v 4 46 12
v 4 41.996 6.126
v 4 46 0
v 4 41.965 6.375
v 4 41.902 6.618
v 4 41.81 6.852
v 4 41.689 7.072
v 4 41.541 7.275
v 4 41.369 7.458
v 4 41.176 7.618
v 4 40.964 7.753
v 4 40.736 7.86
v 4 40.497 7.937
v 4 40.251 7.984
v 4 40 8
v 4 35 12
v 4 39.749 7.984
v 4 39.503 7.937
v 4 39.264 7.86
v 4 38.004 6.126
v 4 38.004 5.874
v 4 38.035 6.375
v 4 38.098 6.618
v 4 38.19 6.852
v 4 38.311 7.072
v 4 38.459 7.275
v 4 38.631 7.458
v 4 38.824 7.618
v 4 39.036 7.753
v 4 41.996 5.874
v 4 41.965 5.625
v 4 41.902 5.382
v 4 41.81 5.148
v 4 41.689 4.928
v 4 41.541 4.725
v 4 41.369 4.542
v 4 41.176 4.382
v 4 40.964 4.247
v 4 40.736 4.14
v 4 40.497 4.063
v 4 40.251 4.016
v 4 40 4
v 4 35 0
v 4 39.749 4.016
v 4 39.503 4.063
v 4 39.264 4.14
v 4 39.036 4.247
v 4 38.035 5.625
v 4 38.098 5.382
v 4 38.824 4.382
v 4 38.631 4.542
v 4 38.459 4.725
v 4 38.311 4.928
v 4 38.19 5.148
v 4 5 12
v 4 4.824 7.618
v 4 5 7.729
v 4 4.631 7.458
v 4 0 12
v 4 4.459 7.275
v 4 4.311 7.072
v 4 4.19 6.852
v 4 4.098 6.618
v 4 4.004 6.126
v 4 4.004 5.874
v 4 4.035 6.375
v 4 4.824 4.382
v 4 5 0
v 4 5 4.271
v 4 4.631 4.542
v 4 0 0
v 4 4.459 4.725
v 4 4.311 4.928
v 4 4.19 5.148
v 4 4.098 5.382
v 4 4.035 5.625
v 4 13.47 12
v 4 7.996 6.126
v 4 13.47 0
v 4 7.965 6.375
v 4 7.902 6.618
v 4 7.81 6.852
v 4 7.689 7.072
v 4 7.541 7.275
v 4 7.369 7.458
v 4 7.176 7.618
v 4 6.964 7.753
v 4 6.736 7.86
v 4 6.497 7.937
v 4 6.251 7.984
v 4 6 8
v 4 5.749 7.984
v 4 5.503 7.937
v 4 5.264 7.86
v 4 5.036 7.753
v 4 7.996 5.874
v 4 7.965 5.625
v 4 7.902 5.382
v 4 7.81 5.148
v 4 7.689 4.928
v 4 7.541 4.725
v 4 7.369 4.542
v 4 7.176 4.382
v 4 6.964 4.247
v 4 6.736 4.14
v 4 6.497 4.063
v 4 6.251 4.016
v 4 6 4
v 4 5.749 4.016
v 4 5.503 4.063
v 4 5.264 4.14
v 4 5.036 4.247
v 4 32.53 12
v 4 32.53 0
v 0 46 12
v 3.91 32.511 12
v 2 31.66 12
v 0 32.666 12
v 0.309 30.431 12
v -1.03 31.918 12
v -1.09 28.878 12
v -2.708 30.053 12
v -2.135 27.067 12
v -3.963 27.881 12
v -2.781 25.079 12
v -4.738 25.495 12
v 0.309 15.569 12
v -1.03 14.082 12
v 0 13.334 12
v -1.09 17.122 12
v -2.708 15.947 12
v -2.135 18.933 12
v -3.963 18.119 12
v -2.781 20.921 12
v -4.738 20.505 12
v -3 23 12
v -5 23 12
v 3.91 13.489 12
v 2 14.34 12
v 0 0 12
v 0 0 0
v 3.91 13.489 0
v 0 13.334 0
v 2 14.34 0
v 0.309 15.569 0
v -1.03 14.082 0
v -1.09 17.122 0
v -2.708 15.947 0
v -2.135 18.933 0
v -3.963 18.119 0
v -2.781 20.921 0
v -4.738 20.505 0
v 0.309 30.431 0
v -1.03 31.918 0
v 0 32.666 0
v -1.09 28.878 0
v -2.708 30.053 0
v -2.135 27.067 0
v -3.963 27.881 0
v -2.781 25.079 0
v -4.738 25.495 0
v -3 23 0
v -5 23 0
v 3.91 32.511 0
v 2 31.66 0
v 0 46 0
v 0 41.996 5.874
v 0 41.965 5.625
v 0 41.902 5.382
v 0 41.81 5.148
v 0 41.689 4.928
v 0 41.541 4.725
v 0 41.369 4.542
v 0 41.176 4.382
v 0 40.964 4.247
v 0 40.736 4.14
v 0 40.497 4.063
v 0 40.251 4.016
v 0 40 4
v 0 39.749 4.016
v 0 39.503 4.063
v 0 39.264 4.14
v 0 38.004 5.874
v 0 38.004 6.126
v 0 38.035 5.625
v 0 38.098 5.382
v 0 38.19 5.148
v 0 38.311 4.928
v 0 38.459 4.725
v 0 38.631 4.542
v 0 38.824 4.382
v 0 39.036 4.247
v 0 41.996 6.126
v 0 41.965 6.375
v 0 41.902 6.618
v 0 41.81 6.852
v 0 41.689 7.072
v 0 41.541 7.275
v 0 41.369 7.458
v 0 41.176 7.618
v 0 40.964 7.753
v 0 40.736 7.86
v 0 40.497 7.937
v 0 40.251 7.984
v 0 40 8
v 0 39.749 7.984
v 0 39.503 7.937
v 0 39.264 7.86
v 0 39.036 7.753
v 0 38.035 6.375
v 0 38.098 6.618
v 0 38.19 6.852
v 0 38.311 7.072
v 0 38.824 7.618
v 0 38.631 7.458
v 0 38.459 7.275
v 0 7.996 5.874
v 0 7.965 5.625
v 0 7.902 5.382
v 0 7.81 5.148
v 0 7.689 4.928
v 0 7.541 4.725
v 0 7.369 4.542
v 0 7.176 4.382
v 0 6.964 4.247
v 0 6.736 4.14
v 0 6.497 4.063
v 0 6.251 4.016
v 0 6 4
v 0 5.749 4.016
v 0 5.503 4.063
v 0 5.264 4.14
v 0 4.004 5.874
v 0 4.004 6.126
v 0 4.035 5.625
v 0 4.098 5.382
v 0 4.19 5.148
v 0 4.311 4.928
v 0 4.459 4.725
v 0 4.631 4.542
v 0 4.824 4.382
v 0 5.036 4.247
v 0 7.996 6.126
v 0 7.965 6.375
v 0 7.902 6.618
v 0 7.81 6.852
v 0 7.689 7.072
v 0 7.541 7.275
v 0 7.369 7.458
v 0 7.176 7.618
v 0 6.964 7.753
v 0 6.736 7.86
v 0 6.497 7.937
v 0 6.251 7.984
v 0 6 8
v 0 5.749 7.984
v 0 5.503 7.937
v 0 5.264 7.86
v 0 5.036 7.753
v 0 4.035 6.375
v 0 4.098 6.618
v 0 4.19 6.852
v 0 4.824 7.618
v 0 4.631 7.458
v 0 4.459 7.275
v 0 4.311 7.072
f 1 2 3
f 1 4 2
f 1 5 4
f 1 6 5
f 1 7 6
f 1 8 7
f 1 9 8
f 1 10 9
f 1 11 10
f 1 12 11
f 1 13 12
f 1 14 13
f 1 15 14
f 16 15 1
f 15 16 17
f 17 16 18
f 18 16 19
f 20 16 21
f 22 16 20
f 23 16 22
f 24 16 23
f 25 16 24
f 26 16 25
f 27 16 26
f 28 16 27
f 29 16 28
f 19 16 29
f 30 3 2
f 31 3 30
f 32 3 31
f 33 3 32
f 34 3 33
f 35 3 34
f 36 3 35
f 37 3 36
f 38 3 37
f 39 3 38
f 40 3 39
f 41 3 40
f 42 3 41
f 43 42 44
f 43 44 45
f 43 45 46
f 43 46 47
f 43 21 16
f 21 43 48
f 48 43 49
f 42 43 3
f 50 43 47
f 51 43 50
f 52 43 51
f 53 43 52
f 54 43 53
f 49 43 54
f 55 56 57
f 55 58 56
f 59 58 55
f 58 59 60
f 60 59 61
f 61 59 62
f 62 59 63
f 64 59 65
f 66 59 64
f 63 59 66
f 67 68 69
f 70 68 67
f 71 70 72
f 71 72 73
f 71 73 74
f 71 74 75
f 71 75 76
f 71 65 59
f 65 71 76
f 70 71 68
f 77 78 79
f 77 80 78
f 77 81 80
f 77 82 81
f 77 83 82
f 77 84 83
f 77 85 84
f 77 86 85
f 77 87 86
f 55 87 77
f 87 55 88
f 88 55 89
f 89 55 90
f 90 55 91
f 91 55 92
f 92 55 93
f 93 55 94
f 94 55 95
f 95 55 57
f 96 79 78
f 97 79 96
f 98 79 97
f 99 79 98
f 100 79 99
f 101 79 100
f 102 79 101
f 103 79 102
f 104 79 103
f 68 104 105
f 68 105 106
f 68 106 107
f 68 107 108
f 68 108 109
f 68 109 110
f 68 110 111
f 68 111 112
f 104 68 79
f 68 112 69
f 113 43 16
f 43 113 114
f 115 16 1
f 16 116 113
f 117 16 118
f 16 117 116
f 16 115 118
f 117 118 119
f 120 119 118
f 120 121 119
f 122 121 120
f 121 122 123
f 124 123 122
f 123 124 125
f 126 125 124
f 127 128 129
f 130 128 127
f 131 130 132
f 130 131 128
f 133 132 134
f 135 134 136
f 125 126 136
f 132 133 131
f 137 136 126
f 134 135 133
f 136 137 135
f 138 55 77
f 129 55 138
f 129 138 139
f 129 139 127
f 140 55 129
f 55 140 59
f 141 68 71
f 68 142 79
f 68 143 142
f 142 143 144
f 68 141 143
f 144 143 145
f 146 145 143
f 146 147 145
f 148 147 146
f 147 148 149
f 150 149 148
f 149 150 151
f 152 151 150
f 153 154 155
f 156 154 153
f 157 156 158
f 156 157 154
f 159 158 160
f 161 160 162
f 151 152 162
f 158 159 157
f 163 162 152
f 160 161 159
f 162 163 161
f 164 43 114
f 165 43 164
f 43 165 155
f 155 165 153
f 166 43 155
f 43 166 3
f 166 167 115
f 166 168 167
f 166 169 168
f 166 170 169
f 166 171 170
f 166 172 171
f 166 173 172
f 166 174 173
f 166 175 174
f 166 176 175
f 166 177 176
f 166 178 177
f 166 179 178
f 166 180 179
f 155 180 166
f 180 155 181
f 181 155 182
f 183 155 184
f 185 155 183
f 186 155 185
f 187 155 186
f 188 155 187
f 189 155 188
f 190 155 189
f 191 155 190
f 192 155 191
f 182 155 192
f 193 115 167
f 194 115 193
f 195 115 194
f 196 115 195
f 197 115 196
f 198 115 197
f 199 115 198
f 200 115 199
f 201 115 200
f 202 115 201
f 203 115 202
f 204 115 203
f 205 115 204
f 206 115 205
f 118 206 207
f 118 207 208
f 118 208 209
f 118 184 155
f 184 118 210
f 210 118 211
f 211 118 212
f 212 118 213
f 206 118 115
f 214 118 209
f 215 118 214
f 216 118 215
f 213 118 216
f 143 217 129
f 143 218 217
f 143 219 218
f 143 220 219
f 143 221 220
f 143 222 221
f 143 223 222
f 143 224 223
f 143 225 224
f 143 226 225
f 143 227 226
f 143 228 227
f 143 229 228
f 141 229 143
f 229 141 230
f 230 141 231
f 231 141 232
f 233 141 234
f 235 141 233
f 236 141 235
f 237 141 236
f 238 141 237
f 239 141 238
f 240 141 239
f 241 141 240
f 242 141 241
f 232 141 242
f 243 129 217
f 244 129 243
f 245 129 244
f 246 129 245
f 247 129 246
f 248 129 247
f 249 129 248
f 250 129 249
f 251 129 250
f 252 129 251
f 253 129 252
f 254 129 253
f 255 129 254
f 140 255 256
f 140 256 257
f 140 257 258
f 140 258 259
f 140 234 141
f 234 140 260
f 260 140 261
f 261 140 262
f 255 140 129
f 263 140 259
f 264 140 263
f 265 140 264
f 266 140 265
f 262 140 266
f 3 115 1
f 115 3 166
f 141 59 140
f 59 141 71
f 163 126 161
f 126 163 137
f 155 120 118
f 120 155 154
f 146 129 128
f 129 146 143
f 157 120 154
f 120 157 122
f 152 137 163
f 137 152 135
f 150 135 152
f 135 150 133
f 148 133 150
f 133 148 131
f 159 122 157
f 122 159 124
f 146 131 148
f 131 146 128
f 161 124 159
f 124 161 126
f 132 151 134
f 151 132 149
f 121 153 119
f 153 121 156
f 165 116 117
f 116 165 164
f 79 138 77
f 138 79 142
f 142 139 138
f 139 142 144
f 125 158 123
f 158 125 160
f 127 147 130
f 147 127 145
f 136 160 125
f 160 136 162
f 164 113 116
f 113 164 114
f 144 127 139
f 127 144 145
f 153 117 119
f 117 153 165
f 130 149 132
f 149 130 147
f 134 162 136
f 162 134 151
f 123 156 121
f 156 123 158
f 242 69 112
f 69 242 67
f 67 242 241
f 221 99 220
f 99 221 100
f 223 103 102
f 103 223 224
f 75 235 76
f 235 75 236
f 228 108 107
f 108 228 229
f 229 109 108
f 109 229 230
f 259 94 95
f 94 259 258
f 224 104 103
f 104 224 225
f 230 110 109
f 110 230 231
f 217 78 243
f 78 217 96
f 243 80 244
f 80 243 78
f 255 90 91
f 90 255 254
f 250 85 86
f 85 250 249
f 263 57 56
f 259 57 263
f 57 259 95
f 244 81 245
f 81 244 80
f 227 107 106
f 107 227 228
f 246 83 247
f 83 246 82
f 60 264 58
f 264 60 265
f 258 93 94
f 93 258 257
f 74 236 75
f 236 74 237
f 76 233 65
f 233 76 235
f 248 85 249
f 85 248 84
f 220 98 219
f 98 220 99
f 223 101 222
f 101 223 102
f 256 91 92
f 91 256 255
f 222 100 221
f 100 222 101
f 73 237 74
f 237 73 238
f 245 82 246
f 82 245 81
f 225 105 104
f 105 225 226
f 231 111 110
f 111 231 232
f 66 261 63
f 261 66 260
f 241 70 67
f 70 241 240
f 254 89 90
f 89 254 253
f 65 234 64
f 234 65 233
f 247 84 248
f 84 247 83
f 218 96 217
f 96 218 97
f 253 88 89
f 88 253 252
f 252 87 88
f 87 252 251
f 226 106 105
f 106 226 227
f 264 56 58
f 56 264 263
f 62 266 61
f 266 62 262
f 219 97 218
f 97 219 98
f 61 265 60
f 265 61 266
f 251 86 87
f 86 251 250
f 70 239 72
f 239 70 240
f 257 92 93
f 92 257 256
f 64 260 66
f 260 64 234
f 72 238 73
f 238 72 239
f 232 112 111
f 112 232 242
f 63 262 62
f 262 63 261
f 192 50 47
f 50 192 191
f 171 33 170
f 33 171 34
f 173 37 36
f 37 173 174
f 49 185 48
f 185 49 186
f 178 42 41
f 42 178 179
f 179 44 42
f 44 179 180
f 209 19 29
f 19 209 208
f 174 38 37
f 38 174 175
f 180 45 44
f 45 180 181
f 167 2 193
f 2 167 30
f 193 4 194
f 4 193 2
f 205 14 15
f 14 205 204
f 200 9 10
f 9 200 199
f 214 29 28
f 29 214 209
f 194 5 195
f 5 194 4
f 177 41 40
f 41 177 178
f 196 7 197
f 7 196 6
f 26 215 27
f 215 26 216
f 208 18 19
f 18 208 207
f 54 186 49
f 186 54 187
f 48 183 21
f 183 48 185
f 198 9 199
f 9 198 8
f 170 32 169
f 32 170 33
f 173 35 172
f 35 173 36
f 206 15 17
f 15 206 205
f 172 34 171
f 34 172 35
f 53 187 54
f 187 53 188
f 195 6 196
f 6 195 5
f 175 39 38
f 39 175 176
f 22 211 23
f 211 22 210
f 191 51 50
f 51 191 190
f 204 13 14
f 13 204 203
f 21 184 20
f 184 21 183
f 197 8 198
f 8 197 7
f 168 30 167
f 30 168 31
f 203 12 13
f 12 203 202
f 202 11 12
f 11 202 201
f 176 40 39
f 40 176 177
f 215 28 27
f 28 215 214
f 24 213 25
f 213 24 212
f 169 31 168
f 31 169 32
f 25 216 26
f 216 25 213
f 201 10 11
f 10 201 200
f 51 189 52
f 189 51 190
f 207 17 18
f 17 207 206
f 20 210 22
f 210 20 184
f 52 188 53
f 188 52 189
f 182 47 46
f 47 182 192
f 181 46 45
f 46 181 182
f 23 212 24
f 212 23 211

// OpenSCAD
// Pole Mount

difference () {
  union () {
     cube([4,46,12]);
     translate ([7,23,0]) cylinder (h=12,r=12);
    }
  translate ([7,23,-1]) cylinder (h=14, r=10);
  translate ([-10, 6,6]) rotate ([0,90,0]) cylinder (h=15,r=2, $fn=50);
  translate ([-10, 40,6]) rotate ([0,90,0]) cylinder (h=15,r=2, $fn=50);
  translate ([4,5,-1]) cube([15,30,14]);

}
